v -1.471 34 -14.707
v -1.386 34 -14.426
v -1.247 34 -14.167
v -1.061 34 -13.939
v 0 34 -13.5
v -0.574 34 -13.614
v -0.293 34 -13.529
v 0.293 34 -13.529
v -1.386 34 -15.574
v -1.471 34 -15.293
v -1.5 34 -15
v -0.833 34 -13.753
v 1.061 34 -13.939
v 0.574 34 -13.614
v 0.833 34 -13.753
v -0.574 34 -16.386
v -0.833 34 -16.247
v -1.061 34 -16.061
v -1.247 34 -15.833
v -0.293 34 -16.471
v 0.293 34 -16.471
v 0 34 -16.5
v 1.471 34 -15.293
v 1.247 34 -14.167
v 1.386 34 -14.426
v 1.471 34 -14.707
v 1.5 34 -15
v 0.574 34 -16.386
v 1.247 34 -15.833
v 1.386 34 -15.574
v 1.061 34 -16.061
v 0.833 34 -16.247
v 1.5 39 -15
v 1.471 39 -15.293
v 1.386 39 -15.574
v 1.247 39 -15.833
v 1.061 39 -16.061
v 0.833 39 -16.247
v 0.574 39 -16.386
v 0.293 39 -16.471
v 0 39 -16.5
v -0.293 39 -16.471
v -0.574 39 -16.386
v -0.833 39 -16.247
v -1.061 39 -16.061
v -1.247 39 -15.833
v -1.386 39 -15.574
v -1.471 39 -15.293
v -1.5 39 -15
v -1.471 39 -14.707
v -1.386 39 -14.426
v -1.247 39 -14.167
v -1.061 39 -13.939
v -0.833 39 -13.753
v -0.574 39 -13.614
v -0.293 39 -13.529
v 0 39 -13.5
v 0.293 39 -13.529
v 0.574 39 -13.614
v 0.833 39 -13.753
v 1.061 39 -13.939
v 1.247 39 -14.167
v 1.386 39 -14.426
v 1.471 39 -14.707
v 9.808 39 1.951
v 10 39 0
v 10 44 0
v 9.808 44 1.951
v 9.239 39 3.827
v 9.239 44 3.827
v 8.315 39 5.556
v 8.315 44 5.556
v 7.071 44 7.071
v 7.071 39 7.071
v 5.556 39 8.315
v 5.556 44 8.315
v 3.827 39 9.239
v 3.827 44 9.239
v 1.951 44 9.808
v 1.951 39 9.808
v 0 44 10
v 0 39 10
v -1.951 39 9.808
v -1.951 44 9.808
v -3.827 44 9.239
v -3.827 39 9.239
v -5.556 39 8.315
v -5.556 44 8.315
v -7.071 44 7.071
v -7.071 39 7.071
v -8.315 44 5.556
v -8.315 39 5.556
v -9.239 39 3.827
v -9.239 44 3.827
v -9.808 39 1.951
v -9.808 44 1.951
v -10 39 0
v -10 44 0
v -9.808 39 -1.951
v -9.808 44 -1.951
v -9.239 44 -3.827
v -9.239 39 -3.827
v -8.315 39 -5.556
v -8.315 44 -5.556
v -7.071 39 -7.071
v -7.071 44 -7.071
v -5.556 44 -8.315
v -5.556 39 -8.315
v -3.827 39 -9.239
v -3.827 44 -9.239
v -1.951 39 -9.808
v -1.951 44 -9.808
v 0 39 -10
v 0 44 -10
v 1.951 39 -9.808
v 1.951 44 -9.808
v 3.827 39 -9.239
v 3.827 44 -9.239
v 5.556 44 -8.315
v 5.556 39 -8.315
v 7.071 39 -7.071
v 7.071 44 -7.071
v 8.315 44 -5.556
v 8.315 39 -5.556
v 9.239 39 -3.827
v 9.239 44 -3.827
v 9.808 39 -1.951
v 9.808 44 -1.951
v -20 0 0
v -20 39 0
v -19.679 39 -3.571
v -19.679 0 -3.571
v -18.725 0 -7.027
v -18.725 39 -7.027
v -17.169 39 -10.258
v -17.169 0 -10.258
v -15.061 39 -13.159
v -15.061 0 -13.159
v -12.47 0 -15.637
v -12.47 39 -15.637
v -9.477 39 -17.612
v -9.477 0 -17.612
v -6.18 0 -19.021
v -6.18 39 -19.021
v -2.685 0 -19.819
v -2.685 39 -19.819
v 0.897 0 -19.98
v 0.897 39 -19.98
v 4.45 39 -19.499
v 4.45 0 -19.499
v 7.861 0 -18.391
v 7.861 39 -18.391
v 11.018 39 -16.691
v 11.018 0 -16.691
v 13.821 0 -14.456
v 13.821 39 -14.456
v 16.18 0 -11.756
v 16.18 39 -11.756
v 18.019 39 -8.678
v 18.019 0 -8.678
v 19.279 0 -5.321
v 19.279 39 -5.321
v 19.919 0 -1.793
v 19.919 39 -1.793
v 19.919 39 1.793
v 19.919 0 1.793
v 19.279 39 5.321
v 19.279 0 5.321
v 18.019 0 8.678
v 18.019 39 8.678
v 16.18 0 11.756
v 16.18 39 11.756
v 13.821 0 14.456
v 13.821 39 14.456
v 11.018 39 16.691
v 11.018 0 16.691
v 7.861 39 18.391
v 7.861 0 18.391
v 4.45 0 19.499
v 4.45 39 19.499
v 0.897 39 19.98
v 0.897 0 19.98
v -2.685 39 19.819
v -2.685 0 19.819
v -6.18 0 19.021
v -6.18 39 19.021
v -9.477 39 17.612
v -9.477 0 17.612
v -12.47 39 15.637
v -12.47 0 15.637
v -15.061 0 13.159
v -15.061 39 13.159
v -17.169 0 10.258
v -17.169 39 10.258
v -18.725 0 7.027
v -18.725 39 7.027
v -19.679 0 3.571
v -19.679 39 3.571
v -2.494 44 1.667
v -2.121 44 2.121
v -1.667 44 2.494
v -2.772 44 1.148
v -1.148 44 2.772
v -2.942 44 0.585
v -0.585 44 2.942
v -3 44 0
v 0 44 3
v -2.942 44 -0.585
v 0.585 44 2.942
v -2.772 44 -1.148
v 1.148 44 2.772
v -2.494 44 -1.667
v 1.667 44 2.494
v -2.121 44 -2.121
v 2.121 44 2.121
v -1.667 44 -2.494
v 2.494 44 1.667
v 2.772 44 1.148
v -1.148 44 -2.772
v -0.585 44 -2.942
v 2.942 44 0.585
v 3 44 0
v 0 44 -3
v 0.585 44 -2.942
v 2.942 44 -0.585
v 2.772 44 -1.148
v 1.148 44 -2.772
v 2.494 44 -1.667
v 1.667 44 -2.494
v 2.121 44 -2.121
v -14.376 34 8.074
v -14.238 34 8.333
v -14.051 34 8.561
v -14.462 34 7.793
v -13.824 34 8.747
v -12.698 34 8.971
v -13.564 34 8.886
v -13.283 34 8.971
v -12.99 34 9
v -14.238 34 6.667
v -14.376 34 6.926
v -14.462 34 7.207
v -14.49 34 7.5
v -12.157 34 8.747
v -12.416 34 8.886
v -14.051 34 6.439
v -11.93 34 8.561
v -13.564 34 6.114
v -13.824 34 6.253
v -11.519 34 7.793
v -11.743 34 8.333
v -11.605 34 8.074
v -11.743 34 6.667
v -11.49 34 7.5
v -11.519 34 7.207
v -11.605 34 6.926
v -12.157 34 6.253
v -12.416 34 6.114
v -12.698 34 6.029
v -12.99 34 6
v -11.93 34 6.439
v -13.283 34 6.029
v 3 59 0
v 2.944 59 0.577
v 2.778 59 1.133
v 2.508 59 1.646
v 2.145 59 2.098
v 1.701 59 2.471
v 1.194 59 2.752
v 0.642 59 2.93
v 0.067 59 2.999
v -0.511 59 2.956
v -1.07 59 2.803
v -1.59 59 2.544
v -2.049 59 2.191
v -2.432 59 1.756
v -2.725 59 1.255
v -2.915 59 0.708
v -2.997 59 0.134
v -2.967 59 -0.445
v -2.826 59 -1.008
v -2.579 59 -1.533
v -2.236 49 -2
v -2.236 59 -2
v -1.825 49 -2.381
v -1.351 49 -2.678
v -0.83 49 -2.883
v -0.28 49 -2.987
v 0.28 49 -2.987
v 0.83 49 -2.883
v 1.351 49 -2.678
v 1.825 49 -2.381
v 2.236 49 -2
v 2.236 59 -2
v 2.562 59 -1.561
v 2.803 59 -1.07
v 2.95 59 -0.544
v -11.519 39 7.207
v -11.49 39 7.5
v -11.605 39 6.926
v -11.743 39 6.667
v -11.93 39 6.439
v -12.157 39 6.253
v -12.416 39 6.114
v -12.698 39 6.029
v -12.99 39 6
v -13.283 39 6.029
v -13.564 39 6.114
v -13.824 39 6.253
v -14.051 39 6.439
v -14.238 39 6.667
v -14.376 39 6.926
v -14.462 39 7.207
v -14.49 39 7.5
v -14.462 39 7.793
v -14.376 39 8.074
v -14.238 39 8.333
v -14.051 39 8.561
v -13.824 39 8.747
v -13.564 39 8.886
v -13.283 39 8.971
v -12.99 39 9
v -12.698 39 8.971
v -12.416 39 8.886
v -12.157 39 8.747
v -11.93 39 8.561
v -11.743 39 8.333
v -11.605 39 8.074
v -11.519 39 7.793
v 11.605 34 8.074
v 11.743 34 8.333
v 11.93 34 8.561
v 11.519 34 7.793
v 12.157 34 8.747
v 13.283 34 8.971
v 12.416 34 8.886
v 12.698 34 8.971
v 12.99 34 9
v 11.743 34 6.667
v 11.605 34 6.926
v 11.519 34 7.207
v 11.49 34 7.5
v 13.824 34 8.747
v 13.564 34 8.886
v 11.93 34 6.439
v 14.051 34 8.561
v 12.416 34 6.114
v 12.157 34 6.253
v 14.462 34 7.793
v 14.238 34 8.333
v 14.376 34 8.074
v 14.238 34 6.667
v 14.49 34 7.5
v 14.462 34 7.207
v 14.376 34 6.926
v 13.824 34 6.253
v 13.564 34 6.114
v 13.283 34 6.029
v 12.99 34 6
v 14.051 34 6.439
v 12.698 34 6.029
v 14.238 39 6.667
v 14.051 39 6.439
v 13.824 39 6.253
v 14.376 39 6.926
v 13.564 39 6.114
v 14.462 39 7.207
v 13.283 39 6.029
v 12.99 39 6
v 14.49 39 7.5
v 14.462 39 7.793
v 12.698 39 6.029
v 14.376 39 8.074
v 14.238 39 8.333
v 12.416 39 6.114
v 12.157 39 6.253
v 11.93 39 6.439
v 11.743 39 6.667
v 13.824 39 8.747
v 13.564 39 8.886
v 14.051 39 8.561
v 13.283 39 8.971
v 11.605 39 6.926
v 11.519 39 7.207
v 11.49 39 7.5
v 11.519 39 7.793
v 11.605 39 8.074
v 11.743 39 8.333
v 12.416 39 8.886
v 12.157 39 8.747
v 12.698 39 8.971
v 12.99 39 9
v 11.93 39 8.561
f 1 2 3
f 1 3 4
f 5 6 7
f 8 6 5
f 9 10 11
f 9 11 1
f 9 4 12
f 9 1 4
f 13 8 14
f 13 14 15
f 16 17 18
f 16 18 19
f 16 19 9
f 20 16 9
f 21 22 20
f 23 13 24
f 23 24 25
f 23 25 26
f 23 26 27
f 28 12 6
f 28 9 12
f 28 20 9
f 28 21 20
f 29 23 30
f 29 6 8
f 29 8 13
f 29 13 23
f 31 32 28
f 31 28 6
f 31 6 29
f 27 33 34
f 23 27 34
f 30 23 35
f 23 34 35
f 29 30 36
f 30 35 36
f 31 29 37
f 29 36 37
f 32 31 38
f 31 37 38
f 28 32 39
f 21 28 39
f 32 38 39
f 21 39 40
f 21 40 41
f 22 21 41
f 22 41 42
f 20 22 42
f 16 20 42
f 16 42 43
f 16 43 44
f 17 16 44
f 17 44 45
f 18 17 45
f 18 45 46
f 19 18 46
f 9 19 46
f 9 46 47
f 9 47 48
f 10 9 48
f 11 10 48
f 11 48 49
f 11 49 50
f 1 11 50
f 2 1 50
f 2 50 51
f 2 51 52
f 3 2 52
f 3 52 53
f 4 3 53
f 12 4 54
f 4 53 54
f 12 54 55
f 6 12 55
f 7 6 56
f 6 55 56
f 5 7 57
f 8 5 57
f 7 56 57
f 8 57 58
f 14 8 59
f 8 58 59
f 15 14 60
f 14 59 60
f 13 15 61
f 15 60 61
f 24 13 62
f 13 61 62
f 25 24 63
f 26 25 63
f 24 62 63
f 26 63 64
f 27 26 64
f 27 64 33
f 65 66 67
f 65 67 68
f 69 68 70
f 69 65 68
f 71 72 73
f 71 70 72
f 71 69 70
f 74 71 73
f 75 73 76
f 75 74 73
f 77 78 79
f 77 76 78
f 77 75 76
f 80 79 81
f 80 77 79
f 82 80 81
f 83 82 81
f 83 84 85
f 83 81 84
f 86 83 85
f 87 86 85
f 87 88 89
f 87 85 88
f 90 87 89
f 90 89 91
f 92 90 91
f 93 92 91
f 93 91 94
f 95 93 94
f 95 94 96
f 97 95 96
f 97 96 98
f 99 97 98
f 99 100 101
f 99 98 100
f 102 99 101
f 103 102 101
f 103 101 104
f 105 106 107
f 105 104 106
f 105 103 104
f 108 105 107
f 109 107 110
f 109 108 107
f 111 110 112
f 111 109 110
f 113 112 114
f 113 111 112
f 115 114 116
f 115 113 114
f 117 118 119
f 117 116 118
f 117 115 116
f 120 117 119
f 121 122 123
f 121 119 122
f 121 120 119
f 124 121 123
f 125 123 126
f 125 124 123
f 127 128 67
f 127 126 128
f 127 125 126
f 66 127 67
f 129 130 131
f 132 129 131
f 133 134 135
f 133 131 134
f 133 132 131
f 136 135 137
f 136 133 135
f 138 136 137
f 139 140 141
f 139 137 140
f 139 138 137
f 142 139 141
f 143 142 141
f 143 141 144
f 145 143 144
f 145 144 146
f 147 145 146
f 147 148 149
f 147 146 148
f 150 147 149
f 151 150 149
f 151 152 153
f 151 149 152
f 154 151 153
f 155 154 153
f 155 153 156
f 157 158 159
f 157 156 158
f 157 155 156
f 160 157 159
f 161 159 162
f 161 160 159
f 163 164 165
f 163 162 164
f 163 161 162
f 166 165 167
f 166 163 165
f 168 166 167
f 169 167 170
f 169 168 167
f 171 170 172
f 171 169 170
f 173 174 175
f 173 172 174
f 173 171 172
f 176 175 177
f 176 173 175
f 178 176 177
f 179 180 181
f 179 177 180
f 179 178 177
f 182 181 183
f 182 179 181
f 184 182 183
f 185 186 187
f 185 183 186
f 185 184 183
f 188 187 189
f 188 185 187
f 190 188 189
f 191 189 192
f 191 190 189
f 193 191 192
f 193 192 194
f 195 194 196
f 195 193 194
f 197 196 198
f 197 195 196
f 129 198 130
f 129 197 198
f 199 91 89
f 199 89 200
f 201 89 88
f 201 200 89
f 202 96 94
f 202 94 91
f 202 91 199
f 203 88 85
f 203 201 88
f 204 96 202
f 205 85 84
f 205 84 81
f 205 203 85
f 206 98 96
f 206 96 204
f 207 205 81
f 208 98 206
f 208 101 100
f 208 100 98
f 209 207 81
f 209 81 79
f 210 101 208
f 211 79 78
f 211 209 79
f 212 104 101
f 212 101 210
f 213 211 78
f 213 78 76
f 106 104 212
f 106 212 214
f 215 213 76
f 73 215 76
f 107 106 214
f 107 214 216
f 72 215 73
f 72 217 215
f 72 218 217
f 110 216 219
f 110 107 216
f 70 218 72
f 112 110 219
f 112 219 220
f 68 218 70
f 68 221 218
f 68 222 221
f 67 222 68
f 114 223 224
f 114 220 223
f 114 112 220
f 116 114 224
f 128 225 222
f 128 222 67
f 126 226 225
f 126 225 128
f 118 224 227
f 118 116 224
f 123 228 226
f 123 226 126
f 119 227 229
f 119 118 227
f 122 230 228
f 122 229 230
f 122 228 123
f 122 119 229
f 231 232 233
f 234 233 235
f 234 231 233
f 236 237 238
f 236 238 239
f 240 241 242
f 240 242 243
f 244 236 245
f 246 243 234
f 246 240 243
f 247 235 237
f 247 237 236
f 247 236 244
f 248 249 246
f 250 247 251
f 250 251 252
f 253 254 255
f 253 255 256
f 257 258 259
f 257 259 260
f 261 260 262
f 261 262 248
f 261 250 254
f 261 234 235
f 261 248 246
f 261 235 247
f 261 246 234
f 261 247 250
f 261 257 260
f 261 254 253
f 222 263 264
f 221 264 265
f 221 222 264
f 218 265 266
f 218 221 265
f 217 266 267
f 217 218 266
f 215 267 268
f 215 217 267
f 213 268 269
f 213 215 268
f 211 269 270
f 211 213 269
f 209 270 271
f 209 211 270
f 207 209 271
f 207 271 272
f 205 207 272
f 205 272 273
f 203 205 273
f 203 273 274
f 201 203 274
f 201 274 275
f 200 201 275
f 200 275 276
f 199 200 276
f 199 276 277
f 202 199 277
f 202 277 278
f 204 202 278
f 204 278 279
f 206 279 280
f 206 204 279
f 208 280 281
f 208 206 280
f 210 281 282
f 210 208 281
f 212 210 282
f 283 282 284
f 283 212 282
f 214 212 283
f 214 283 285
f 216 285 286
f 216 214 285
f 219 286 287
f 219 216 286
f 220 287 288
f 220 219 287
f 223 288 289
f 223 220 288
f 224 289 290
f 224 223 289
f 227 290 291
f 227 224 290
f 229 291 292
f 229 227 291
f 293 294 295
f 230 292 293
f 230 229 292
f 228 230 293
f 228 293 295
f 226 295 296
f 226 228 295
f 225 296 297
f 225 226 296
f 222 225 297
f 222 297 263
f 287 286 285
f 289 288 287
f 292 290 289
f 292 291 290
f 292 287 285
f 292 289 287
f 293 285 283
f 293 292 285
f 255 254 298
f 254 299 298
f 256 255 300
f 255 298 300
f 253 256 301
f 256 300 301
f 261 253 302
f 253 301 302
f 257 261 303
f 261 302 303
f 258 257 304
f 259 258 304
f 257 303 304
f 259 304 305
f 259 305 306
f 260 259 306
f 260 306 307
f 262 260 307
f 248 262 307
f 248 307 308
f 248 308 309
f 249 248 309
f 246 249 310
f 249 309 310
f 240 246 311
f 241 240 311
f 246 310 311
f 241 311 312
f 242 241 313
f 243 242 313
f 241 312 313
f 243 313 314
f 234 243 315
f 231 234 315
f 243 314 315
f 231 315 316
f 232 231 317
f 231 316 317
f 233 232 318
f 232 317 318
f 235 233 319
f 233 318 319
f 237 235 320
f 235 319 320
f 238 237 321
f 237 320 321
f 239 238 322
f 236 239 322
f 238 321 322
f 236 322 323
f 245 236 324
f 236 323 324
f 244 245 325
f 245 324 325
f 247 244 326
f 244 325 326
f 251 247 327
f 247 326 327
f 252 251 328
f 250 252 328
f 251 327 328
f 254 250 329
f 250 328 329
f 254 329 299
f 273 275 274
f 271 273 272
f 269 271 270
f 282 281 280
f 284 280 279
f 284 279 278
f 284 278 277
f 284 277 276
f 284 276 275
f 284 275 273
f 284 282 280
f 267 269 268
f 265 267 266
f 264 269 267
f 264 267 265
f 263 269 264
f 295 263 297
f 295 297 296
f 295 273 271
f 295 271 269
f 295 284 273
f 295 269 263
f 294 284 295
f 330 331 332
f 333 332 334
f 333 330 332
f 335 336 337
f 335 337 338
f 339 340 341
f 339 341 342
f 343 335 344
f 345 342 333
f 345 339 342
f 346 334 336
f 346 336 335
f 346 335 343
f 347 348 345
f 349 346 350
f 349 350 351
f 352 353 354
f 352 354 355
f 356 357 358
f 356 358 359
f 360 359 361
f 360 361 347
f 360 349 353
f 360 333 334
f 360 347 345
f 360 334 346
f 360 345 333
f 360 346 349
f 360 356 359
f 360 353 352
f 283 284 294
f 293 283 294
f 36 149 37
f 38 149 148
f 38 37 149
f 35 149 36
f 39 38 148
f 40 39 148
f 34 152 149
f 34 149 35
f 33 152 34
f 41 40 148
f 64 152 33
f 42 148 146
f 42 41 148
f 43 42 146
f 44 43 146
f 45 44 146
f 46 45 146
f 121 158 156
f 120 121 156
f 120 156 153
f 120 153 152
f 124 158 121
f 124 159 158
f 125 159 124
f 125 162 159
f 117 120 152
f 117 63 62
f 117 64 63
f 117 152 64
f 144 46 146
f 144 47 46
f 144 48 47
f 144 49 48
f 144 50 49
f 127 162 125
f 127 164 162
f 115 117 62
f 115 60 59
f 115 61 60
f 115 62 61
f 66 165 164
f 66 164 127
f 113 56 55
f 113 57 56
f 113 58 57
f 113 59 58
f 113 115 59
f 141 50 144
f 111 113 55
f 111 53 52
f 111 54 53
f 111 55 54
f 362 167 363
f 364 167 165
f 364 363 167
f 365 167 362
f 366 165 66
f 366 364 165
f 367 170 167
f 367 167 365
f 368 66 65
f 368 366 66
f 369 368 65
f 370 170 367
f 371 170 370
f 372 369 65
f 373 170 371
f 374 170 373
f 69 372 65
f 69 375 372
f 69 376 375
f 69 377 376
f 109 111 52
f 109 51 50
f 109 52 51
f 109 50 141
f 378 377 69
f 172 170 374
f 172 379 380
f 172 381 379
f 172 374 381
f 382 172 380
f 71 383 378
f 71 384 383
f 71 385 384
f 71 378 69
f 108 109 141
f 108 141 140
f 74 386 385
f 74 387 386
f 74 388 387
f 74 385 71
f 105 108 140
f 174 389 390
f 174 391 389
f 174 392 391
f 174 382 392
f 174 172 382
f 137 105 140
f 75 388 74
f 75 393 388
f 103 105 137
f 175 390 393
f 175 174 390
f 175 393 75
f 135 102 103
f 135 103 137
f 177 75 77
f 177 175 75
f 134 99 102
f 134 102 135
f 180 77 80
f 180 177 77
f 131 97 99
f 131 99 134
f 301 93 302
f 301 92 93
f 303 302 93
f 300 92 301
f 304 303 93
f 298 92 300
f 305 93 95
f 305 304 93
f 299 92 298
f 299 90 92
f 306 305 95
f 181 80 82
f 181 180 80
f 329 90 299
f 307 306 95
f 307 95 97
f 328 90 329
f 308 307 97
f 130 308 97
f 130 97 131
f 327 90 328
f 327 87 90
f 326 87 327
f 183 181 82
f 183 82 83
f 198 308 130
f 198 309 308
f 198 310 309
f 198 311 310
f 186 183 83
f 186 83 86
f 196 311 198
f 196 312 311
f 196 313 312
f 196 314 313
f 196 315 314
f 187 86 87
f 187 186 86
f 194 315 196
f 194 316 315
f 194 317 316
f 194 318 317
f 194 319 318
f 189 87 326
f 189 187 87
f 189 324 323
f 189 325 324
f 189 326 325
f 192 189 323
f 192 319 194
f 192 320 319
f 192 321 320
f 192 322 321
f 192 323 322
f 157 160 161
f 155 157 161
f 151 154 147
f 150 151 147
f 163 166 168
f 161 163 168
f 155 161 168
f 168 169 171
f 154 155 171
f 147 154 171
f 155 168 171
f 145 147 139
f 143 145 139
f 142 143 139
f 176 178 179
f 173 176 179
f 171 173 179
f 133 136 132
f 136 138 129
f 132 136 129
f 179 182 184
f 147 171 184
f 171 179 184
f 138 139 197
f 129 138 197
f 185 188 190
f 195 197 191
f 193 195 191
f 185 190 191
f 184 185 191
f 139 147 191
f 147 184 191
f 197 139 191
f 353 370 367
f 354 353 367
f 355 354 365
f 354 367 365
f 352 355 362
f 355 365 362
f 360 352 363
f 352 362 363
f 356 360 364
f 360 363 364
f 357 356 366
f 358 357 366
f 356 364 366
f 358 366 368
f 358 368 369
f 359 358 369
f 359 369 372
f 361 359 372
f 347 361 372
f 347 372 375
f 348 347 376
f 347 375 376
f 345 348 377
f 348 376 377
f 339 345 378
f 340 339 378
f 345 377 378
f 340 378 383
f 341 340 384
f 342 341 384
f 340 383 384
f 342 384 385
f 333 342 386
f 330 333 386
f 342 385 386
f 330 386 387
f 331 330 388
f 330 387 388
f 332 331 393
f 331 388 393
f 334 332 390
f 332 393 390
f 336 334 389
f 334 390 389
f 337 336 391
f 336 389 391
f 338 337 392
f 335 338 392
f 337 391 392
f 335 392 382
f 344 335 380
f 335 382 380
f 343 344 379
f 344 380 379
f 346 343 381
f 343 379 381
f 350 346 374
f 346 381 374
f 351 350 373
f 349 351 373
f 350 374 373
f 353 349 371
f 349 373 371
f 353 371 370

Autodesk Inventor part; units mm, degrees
ref_plane "YZ Plane" through (0, 0, 0) normal (1, 0, 0) x (0, 1, 0)
ref_plane "XZ Plane" through (0, 0, 0) normal (0, 1, 0) x (-1, 0, 0)
ref_plane "XY Plane" through (0, 0, 0) normal (0, 0, 1) x (1, 0, 0)
sketch "Esquisse1" plane through (0, 0, 0) normal (0, 1, 0) x (-1, 0, 0)
  circle A0 centre (0, 0) radius 20
  dimension "d0" = 40
extrude "Extrusion1" add sketch "Esquisse1" along normal blind 39
sketch "Esquisse2" plane through (0, 39, 0) normal (0, 1, 0) x (1, 0, 0)
  circle A0 centre (0, 0) radius 20 projected
  circle A1 centre (0, 0) radius 10
  dimension "d3" = 20
extrude "Extrusion2" add sketch "Esquisse2" along normal blind 5 contours A1
sketch "Esquisse3" plane through (0, 44, 0) normal (0, 1, 0) x (1, 0, 0)
  circle A0 centre (0, 0) radius 10 projected
  circle A1 centre (0, 0) radius 3
  dimension "d6" = 6
extrude "Extrusion3" add sketch "Esquisse3" along normal blind 15 contours A1
sketch "Esquisse4" plane through (0, 59, 0) normal (0, 1, 0) x (1, 0, 0)
  circle A0 centre (0, 0) radius 3 construction
  line L0 (-2.2361, 2) -> (2.2361, 2)
  line L1 (2.2361, 2) -> (2.2361, -2) construction
  line L2 (2.2361, -2) -> (-2.2361, -2) construction
  line L3 (-2.2361, -2) -> (-2.2361, 2) construction
  arc A1 (-2.2361, 2) -> (2.2361, 2) centre (0, 0) ccw
  arc A2 (2.2361, 2) -> (-2.2361, 2) centre (0, 0) ccw
  dimension "d9" = 4
extrude "Extrusion4" cut sketch "Esquisse4" against normal blind 10 contours A2 L0
sketch "Esquisse5" plane through (0, 39, 0) normal (0, 1, 0) x (1, 0, 0)
  circle A0 centre (0, 0) radius 10 projected
  circle A1 centre (0, 0) radius 20 projected
  circle A2 centre (0, 0) radius 15 construction
  circle A3 centre (0, 15) radius 1.5
  circle A4 centre (-12.9904, -7.5) radius 1.5
  circle A5 centre (12.9904, -7.5) radius 1.5
  dimension "d12" = 30
  dimension "d13" = 3
  dimension "d16" = 360
extrude "Extrusion5" cut sketch "Esquisse5" against normal blind 5 contours A3 | A4 | A5
properties part number "encoder_E6B2"
